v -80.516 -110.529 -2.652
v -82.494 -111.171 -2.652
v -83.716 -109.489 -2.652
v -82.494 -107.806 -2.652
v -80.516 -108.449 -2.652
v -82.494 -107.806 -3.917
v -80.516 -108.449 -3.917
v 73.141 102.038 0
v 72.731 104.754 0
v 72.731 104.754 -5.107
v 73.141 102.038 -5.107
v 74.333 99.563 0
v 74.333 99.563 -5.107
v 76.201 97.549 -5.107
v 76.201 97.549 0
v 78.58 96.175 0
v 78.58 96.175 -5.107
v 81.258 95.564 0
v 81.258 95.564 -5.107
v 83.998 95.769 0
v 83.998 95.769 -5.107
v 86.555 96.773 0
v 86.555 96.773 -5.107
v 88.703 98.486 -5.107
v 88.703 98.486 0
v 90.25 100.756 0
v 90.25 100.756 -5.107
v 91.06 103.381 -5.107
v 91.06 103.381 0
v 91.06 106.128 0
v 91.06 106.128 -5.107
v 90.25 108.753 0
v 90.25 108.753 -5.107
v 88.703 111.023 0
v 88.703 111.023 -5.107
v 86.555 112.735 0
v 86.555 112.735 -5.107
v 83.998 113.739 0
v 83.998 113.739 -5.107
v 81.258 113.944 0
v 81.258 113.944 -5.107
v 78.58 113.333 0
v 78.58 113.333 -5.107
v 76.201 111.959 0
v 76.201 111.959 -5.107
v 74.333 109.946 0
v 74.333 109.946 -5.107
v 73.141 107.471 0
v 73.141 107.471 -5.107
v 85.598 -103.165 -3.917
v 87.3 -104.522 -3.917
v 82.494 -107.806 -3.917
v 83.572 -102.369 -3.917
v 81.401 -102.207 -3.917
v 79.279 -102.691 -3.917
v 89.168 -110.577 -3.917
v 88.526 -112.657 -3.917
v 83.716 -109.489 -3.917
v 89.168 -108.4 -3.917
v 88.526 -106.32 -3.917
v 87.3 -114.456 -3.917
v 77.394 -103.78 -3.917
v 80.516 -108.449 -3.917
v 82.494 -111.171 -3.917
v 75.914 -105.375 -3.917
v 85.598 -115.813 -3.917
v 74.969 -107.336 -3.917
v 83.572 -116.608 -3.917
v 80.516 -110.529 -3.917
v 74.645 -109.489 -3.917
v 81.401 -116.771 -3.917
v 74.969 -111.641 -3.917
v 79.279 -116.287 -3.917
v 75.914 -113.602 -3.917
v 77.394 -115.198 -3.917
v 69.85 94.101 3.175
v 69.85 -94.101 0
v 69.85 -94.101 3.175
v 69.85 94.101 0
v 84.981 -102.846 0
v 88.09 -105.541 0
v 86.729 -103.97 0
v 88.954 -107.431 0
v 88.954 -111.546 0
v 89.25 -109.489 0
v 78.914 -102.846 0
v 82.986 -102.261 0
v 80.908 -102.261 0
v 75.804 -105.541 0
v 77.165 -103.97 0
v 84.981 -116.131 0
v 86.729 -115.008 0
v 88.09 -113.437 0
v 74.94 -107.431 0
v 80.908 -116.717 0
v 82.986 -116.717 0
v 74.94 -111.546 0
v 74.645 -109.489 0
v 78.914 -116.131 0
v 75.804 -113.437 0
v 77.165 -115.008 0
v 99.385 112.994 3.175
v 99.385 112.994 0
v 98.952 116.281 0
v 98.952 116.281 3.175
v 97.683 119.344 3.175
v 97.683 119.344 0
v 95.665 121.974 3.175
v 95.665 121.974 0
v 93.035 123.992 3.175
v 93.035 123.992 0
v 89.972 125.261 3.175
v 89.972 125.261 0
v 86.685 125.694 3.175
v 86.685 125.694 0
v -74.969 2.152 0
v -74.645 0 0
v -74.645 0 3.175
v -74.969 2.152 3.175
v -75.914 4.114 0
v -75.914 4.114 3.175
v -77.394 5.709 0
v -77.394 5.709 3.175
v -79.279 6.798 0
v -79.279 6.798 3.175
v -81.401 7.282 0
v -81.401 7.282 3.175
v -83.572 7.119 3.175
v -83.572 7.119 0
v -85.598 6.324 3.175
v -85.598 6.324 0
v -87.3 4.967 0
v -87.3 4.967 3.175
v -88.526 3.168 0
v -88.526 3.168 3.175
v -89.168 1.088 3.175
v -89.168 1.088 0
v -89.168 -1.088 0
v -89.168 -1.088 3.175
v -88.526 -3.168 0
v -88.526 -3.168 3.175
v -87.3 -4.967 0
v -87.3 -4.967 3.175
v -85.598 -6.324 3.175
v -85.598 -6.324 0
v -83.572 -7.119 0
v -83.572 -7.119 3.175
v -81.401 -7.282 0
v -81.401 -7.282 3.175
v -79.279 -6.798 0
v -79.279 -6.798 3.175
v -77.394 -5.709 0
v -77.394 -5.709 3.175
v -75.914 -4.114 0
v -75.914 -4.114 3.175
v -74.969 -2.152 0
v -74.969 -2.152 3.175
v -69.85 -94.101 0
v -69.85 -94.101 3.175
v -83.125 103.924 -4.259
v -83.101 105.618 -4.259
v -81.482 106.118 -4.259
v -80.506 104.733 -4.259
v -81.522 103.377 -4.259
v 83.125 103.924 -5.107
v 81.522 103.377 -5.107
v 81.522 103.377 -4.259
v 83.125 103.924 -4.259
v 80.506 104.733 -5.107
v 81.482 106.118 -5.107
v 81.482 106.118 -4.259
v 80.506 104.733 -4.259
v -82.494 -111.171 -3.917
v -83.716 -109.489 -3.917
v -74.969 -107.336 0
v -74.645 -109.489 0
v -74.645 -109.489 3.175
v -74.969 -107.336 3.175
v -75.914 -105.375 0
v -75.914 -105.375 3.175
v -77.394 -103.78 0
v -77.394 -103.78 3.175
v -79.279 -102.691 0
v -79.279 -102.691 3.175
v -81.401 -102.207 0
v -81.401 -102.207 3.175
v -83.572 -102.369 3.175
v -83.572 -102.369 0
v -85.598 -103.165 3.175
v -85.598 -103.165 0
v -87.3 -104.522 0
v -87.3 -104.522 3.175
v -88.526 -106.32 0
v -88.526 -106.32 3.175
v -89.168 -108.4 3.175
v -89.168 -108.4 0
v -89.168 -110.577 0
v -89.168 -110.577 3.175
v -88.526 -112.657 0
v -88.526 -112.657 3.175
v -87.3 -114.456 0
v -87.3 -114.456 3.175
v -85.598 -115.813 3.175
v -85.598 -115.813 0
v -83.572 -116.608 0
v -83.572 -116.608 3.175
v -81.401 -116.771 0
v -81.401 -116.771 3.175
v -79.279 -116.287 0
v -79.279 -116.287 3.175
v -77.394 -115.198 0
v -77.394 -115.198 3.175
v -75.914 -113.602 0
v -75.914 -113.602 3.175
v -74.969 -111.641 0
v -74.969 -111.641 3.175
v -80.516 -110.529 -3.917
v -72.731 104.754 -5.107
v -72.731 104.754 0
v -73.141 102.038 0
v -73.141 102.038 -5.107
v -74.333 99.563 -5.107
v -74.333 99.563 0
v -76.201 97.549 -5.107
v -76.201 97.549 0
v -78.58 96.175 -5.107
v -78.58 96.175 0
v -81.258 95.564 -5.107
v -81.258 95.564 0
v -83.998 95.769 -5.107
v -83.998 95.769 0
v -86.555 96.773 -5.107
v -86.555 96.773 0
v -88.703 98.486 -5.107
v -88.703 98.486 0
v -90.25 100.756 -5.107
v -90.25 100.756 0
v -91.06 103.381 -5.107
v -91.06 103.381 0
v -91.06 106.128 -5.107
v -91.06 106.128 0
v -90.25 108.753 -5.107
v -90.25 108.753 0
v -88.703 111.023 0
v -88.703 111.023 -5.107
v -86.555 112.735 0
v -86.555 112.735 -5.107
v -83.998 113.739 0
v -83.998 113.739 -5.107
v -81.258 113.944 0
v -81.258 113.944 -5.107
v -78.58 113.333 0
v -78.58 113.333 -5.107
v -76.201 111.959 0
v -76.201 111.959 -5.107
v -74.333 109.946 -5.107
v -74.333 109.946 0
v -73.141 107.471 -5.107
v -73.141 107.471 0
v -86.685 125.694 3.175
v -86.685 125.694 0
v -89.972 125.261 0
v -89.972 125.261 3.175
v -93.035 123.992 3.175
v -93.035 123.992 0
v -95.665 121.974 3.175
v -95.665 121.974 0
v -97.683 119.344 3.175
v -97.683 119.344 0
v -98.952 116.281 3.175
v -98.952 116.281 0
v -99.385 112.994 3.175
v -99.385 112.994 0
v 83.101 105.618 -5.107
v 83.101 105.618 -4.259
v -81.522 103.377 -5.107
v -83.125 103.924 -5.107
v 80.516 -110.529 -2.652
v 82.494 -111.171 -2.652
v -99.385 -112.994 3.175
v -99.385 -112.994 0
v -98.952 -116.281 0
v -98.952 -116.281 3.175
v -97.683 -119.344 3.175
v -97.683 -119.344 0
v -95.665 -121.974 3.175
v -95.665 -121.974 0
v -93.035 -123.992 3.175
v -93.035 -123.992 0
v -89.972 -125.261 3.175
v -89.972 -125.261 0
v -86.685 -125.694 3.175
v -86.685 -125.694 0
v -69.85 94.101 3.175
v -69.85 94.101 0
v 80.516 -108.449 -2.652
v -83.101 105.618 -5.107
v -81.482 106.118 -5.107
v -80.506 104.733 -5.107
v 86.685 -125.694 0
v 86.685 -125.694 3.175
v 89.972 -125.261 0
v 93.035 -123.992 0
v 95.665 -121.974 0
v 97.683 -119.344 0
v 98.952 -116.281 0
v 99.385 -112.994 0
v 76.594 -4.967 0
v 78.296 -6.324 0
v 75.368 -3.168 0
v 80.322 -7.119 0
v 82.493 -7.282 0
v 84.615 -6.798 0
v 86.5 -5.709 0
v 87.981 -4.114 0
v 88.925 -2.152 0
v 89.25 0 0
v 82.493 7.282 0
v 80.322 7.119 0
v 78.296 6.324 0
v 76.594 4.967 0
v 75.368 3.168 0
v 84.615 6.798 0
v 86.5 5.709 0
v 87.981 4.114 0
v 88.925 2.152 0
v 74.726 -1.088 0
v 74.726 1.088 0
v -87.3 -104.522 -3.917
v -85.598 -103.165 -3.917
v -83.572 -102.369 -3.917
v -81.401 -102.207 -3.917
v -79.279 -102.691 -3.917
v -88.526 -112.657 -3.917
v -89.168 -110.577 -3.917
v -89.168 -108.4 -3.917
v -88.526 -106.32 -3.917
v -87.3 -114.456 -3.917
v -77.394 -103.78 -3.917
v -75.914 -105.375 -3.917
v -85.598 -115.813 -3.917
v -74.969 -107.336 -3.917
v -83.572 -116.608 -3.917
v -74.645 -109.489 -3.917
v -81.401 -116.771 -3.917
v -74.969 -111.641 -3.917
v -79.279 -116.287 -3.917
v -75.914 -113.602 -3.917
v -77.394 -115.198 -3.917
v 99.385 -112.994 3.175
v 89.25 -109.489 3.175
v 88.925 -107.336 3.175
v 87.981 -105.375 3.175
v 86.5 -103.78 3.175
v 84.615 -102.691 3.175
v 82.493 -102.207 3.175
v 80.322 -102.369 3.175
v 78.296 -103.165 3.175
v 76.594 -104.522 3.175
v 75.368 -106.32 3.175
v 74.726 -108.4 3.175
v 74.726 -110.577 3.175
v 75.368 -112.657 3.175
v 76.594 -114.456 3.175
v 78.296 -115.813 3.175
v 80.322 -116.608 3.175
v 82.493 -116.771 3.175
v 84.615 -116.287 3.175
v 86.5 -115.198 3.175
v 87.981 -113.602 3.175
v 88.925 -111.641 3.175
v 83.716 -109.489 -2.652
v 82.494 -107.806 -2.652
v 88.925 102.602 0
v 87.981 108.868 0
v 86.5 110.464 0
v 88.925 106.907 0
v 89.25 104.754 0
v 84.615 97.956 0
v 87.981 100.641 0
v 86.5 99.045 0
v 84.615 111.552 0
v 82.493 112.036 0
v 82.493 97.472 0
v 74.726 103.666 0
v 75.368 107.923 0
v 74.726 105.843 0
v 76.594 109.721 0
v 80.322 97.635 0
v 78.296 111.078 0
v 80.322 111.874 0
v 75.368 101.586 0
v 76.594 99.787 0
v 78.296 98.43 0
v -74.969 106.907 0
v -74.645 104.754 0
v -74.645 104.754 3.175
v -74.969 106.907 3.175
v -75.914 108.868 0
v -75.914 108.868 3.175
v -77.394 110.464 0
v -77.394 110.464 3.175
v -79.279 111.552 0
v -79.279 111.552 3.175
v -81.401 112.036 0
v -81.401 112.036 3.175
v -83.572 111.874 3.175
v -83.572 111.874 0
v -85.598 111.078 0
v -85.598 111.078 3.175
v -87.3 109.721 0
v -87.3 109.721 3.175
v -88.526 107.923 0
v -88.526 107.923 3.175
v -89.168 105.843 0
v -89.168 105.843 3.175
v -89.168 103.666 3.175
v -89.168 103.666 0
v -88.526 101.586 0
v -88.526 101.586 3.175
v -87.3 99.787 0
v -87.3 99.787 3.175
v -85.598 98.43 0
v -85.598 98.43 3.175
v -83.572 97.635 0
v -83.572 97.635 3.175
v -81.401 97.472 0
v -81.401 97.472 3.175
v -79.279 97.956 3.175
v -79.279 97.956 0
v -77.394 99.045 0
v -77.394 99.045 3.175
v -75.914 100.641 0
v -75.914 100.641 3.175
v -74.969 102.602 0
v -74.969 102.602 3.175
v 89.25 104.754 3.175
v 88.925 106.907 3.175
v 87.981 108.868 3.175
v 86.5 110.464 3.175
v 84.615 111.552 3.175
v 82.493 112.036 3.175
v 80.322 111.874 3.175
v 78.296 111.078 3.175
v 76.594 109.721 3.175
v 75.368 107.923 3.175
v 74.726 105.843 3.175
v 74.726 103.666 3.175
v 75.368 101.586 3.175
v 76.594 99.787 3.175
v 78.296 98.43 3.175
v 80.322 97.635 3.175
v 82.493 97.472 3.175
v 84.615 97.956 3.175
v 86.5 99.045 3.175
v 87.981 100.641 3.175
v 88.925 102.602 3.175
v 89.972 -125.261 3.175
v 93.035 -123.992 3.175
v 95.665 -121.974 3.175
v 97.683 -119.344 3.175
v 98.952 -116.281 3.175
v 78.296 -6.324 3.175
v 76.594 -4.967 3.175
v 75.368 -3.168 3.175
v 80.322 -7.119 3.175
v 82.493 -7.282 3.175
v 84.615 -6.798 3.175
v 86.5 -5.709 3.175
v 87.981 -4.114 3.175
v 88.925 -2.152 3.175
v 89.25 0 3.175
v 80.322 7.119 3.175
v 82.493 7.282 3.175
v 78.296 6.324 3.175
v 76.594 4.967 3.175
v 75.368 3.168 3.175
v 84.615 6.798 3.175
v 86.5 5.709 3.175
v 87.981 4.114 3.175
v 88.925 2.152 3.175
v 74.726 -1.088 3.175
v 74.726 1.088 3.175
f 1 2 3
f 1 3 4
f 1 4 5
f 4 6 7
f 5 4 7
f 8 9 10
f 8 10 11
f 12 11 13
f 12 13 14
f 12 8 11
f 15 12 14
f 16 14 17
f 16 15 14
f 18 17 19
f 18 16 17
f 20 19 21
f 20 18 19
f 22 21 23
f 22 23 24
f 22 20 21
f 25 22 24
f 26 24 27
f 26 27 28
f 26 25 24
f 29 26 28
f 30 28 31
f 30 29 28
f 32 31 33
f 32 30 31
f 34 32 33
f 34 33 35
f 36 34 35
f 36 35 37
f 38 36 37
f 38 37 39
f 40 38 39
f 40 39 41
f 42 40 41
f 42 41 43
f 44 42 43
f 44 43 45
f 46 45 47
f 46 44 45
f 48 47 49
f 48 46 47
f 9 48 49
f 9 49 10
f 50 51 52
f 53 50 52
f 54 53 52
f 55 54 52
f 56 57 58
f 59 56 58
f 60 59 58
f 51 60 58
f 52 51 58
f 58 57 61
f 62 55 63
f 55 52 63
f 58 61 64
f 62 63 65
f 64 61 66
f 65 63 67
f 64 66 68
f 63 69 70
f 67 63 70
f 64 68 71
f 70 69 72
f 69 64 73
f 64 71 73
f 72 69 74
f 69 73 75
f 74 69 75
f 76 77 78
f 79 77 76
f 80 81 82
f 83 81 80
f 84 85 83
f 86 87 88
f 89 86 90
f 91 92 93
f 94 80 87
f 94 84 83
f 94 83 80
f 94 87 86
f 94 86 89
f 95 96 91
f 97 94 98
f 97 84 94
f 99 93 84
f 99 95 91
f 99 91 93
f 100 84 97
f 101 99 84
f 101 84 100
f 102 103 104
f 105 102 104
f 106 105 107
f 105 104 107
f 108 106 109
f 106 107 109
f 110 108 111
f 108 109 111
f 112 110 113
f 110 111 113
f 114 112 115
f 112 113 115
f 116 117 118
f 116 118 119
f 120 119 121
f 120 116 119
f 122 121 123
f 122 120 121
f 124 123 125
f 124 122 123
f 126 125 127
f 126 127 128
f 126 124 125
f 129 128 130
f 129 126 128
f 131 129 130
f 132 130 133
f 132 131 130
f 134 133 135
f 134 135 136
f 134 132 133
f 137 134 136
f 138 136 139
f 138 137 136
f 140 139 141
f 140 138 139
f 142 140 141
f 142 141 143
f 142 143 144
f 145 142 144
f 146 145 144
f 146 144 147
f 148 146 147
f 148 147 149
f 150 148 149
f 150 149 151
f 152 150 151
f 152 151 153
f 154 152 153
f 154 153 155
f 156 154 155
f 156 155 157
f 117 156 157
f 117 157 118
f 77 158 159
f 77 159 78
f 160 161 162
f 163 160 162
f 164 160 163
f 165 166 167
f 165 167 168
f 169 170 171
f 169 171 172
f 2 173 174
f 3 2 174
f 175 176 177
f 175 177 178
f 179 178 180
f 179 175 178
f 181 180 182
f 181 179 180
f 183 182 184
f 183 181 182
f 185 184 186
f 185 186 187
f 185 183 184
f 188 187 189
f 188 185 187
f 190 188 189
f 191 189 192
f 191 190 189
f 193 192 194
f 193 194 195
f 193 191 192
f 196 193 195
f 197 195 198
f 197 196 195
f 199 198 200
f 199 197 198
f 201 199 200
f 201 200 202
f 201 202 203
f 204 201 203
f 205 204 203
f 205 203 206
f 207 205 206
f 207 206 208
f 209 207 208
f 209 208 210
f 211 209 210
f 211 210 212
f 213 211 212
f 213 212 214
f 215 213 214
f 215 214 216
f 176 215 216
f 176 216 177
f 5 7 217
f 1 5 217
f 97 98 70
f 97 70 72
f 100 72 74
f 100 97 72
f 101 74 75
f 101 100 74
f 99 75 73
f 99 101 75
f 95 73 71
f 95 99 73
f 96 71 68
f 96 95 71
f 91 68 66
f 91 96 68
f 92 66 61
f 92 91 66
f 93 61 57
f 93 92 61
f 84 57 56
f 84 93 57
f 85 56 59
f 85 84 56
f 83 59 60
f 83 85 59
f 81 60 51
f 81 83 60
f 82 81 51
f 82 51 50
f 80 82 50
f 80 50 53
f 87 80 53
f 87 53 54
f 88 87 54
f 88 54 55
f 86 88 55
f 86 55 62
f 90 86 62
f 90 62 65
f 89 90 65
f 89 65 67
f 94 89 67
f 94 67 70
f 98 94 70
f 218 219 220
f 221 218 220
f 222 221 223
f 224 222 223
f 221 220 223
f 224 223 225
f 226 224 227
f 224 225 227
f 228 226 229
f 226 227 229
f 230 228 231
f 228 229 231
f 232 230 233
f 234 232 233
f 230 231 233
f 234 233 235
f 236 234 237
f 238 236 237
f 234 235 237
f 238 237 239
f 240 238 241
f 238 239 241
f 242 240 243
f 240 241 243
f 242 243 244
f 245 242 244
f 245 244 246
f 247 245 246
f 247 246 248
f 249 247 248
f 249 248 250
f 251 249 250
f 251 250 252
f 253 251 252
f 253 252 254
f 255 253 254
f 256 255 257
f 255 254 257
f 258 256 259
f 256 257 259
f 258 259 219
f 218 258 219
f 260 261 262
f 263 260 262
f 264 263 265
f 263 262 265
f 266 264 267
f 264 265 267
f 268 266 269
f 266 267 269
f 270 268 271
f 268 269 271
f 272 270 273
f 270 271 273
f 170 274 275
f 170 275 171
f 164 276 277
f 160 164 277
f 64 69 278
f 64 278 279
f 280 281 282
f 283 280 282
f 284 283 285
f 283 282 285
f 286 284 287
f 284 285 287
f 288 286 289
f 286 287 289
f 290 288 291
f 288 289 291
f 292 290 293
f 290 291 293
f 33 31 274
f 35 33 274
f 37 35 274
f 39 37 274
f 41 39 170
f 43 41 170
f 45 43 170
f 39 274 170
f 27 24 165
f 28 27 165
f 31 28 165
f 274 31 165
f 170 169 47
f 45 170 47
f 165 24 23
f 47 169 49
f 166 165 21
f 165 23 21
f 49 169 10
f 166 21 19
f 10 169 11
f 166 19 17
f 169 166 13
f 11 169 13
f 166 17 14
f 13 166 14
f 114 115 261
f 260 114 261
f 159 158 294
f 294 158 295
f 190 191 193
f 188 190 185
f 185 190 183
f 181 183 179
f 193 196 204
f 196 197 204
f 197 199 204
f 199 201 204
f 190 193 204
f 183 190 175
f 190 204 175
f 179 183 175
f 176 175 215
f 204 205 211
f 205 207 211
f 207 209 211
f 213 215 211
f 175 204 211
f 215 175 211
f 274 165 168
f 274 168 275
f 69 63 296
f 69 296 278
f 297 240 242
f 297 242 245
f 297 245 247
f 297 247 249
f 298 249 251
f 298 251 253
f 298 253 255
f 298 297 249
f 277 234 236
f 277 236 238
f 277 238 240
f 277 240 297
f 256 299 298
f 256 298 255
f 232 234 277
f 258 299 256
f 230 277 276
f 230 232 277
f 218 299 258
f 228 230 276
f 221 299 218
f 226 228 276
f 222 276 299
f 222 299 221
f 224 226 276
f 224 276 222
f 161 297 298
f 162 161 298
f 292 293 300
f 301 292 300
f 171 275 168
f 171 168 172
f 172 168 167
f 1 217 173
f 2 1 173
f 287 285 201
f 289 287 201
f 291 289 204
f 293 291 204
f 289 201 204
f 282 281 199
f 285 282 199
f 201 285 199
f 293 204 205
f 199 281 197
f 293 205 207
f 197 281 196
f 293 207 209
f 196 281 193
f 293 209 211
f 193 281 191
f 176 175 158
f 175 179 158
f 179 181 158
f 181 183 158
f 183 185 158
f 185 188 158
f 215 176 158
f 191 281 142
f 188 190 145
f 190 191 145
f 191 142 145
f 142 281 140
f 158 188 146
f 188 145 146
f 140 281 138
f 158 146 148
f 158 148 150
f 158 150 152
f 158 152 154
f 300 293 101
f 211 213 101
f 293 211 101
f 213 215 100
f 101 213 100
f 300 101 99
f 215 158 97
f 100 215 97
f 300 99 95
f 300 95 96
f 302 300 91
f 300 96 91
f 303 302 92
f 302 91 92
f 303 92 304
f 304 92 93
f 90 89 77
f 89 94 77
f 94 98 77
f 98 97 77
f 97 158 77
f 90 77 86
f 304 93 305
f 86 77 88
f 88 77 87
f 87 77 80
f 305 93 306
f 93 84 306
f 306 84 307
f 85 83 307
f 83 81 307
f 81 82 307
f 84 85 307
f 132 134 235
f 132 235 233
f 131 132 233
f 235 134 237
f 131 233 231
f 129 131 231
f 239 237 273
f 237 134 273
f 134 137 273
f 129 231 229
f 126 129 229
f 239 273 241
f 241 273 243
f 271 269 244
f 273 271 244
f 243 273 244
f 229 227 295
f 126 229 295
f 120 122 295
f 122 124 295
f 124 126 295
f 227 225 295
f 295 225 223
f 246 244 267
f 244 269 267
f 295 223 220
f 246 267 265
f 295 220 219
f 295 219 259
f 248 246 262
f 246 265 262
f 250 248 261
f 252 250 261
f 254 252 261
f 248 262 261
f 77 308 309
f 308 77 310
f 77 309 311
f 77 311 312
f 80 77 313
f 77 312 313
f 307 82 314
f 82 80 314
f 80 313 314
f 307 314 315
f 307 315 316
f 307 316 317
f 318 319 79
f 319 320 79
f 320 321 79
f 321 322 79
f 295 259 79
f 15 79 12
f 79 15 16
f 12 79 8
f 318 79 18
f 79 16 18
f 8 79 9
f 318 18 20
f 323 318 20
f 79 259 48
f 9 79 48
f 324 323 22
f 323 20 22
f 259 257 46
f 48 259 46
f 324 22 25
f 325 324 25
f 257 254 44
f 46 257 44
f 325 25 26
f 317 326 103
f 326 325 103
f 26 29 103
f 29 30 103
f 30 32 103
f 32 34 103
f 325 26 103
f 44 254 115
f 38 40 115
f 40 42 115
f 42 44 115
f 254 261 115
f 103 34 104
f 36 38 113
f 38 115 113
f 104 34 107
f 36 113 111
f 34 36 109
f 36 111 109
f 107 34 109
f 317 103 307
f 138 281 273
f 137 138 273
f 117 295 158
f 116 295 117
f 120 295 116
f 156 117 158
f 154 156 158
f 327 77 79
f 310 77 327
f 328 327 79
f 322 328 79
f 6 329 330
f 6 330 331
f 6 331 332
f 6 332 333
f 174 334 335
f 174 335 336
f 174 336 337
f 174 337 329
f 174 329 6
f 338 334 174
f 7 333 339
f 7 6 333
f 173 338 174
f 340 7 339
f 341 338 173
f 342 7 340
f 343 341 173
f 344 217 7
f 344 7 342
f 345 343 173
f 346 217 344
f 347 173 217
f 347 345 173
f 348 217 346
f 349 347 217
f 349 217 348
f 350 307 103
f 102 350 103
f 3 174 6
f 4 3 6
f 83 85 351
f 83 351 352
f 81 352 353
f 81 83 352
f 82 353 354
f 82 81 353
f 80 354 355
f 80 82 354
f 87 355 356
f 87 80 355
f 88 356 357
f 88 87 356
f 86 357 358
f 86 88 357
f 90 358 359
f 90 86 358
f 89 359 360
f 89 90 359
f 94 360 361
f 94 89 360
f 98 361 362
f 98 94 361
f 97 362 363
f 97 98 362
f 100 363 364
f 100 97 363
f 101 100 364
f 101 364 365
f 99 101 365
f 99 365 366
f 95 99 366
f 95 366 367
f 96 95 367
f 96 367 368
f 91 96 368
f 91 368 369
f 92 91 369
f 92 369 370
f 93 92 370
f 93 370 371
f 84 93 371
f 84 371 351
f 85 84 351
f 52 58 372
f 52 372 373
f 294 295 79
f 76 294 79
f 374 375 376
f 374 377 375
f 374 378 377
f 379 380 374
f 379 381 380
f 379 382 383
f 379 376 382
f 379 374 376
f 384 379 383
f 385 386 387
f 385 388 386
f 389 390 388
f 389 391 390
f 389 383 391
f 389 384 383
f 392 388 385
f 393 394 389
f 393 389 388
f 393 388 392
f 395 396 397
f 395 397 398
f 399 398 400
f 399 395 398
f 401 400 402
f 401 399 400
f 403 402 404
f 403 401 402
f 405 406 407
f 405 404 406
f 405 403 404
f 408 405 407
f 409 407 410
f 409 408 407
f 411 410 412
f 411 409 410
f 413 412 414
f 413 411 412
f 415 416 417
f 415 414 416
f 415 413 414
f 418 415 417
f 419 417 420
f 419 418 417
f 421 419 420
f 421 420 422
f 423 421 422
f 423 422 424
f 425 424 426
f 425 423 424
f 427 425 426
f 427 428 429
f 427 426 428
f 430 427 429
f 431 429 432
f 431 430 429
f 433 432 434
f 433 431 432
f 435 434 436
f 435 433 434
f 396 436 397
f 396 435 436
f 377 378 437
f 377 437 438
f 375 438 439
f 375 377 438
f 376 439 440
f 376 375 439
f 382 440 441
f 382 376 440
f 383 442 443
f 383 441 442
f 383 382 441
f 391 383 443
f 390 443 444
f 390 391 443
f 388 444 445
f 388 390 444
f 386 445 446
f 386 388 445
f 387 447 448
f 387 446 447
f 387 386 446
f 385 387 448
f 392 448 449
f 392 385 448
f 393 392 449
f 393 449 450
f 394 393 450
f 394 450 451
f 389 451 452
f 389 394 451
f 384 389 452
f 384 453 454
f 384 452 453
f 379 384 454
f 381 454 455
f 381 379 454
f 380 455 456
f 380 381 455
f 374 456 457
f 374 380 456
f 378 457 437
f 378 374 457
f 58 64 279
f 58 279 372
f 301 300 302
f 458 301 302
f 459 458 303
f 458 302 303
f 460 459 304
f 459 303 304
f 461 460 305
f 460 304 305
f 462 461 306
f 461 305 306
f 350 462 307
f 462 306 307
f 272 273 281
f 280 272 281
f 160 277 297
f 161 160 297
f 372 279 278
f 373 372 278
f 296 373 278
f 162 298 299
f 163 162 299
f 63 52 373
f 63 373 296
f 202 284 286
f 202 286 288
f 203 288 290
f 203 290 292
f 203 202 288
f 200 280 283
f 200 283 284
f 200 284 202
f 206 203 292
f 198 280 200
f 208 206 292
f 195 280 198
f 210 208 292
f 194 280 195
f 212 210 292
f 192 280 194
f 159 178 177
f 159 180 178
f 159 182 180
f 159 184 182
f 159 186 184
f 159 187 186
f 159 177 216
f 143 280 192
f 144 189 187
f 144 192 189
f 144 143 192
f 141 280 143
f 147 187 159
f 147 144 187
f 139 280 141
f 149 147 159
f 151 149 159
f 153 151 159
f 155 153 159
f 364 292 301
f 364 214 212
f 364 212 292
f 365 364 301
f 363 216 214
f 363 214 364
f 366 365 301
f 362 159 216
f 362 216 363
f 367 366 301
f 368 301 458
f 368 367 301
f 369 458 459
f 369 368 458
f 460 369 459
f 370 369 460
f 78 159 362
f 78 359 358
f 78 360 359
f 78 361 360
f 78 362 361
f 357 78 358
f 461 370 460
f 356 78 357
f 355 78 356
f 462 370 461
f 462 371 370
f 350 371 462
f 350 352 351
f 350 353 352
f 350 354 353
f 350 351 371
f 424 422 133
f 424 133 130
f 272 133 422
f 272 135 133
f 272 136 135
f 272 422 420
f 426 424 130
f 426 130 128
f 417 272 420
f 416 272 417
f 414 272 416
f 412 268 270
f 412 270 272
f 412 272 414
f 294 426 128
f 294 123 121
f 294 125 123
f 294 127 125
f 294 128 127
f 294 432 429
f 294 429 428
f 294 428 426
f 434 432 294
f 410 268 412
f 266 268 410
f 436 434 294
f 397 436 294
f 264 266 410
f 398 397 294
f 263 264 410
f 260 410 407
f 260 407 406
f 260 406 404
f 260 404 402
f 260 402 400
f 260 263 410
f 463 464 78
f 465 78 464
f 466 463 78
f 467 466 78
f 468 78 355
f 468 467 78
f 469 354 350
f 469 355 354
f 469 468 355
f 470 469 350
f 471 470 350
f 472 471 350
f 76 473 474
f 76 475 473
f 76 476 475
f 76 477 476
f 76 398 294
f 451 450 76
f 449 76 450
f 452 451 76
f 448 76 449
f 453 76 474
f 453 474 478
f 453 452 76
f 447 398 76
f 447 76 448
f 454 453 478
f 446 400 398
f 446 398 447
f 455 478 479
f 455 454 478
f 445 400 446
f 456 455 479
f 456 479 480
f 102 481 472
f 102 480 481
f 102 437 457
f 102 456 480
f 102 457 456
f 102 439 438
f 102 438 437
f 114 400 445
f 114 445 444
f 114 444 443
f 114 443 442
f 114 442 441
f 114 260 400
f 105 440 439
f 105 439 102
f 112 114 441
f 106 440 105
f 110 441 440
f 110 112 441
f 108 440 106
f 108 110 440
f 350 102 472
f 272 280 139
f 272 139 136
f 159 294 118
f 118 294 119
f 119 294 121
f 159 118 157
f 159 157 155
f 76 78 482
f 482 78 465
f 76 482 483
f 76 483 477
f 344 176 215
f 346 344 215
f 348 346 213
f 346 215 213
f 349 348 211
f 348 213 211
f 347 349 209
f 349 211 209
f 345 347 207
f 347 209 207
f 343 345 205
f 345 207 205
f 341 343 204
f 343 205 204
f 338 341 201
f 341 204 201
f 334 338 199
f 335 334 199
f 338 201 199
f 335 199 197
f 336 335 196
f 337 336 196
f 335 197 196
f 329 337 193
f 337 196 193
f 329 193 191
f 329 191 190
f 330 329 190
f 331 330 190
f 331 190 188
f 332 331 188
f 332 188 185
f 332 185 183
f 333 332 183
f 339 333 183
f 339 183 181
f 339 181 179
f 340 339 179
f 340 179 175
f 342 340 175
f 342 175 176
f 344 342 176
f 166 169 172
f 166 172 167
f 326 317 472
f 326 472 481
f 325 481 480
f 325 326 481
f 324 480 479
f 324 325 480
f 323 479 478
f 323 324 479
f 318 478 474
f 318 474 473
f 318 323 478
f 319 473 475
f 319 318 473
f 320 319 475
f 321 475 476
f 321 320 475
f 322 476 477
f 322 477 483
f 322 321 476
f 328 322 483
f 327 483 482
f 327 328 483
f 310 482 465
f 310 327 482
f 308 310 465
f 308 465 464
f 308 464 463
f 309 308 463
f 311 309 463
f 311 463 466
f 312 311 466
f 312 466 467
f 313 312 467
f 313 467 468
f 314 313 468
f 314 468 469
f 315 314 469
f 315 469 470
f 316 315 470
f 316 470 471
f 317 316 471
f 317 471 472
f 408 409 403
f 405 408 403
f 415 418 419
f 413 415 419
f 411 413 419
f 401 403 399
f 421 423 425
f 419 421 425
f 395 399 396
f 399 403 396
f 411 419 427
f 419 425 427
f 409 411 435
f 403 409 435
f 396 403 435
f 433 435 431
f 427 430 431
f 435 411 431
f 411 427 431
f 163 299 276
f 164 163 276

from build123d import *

# Parameters (mm, degrees)
F0_R     = 7.3025
F0_W     = 139.7
F0_H     = 188.2024109364
F1_DEPTH = 3.175
F2_R     = 7.3025
F3_DEPTH = 3.91726
F5_DEPTH = 1.26529
F6_R     = 9.2158818602
F7_DEPTH = 5.10748
F9_DEPTH = 0.84813


with BuildPart() as f1:
    # F0 (on Top) → F1 (new body)
    with BuildSketch(Plane.XY):
        with BuildLine():
            ThreePointArc((-99.3846207857, -112.9937384605), (-95.6648769068, -121.9739945816), (-86.6846207857, -125.6937384605))
            Line((-86.6846207857, -125.6937384605), (86.6846207857, -125.6937384605))
            ThreePointArc((86.6846207857, -125.6937384605), (95.6648769068, -121.9739945816), (99.3846207857, -112.9937384605))
            Line((99.3846207857, -112.9937384605), (99.3846207857, 112.9937384605))
            ThreePointArc((99.3846207857, 112.9937384605), (95.6648769068, 121.9739945816), (86.6846207857, 125.6937384605))
            Line((86.6846207857, 125.6937384605), (-86.6846207857, 125.6937384605))
            ThreePointArc((-86.6846207857, 125.6937384605), (-95.6648769068, 121.9739945816), (-99.3846207857, 112.9937384605))
            Line((-99.3846207857, 112.9937384605), (-99.3846207857, -112.9937384605))
        make_face()
        with Locations((-81.9471254945, -109.4888299704)):
            Circle(F0_R, mode=Mode.SUBTRACT)
        with Locations((81.9471254945, -109.4888299704)):
            Circle(F0_R, mode=Mode.SUBTRACT)
        with Locations((-81.9471254945, 0)):
            Circle(F0_R, mode=Mode.SUBTRACT)
        with Locations((-81.9471254945, 104.7541797161)):
            Circle(F0_R, mode=Mode.SUBTRACT)
        Rectangle(F0_W, F0_H, mode=Mode.SUBTRACT)
        with Locations((81.9471254945, 0)):
            Circle(F0_R, mode=Mode.SUBTRACT)
        with Locations((81.9471254945, 104.7541797161)):
            Circle(F0_R, mode=Mode.SUBTRACT)
    extrude(amount=F1_DEPTH)

    # F6 (on face) → F7 (join)
    with BuildSketch(Plane(origin=(0, 0, 0), x_dir=(1, 0, 0), z_dir=(0, 0, -1))):
        with Locations((-81.9471254945, -104.7541797161)):
            Circle(F6_R)
    extrude(amount=F7_DEPTH)

    # F8 (on face) → F9 (cut)
    with BuildSketch(Plane(origin=(0, 0, -5.10748), x_dir=(1, 0, 0), z_dir=(0, 0, -1))):
        Polygon((-80.5061895981, -104.7332882773), (-81.5217207537, -103.3773124326), (-83.1251468021, -103.9241203757), (-83.1005874429, -105.6180421146), (-81.4819828757, -106.1181353803), align=None)
    extrude(amount=-F9_DEPTH, mode=Mode.SUBTRACT)



with BuildPart() as f3:
    # F2 (on face) → F3 (new body)
    with BuildSketch(Plane(origin=(0, 0, 0), x_dir=(1, 0, 0), z_dir=(0, 0, -1))):
        with Locations((-81.9471254945, 109.4888299704)):
            Circle(F2_R)
    extrude(amount=F3_DEPTH)

    # F4 (on face) → F5 (cut)
    with BuildSketch(Plane(origin=(0, 0, -3.91726), x_dir=(1, 0, 0), z_dir=(0, 0, -1))):
        Polygon((-80.5158242583, 108.4489287519), (-80.5158242583, 110.5287311888), (-82.4938339186, 111.1714254868), (-83.7163111186, 109.4888299704), (-82.4938339186, 107.806234454), align=None)
    extrude(amount=-F5_DEPTH, mode=Mode.SUBTRACT)


with BuildPart() as f1_1:
    add(f1.part)

    add(f3.part)  # F10 merges F3
    # F10: F3, F1 across plane
    add(f3.part.mirror(Plane.YZ))
    add(f1.part.mirror(Plane.YZ))


solid = f1_1.part
